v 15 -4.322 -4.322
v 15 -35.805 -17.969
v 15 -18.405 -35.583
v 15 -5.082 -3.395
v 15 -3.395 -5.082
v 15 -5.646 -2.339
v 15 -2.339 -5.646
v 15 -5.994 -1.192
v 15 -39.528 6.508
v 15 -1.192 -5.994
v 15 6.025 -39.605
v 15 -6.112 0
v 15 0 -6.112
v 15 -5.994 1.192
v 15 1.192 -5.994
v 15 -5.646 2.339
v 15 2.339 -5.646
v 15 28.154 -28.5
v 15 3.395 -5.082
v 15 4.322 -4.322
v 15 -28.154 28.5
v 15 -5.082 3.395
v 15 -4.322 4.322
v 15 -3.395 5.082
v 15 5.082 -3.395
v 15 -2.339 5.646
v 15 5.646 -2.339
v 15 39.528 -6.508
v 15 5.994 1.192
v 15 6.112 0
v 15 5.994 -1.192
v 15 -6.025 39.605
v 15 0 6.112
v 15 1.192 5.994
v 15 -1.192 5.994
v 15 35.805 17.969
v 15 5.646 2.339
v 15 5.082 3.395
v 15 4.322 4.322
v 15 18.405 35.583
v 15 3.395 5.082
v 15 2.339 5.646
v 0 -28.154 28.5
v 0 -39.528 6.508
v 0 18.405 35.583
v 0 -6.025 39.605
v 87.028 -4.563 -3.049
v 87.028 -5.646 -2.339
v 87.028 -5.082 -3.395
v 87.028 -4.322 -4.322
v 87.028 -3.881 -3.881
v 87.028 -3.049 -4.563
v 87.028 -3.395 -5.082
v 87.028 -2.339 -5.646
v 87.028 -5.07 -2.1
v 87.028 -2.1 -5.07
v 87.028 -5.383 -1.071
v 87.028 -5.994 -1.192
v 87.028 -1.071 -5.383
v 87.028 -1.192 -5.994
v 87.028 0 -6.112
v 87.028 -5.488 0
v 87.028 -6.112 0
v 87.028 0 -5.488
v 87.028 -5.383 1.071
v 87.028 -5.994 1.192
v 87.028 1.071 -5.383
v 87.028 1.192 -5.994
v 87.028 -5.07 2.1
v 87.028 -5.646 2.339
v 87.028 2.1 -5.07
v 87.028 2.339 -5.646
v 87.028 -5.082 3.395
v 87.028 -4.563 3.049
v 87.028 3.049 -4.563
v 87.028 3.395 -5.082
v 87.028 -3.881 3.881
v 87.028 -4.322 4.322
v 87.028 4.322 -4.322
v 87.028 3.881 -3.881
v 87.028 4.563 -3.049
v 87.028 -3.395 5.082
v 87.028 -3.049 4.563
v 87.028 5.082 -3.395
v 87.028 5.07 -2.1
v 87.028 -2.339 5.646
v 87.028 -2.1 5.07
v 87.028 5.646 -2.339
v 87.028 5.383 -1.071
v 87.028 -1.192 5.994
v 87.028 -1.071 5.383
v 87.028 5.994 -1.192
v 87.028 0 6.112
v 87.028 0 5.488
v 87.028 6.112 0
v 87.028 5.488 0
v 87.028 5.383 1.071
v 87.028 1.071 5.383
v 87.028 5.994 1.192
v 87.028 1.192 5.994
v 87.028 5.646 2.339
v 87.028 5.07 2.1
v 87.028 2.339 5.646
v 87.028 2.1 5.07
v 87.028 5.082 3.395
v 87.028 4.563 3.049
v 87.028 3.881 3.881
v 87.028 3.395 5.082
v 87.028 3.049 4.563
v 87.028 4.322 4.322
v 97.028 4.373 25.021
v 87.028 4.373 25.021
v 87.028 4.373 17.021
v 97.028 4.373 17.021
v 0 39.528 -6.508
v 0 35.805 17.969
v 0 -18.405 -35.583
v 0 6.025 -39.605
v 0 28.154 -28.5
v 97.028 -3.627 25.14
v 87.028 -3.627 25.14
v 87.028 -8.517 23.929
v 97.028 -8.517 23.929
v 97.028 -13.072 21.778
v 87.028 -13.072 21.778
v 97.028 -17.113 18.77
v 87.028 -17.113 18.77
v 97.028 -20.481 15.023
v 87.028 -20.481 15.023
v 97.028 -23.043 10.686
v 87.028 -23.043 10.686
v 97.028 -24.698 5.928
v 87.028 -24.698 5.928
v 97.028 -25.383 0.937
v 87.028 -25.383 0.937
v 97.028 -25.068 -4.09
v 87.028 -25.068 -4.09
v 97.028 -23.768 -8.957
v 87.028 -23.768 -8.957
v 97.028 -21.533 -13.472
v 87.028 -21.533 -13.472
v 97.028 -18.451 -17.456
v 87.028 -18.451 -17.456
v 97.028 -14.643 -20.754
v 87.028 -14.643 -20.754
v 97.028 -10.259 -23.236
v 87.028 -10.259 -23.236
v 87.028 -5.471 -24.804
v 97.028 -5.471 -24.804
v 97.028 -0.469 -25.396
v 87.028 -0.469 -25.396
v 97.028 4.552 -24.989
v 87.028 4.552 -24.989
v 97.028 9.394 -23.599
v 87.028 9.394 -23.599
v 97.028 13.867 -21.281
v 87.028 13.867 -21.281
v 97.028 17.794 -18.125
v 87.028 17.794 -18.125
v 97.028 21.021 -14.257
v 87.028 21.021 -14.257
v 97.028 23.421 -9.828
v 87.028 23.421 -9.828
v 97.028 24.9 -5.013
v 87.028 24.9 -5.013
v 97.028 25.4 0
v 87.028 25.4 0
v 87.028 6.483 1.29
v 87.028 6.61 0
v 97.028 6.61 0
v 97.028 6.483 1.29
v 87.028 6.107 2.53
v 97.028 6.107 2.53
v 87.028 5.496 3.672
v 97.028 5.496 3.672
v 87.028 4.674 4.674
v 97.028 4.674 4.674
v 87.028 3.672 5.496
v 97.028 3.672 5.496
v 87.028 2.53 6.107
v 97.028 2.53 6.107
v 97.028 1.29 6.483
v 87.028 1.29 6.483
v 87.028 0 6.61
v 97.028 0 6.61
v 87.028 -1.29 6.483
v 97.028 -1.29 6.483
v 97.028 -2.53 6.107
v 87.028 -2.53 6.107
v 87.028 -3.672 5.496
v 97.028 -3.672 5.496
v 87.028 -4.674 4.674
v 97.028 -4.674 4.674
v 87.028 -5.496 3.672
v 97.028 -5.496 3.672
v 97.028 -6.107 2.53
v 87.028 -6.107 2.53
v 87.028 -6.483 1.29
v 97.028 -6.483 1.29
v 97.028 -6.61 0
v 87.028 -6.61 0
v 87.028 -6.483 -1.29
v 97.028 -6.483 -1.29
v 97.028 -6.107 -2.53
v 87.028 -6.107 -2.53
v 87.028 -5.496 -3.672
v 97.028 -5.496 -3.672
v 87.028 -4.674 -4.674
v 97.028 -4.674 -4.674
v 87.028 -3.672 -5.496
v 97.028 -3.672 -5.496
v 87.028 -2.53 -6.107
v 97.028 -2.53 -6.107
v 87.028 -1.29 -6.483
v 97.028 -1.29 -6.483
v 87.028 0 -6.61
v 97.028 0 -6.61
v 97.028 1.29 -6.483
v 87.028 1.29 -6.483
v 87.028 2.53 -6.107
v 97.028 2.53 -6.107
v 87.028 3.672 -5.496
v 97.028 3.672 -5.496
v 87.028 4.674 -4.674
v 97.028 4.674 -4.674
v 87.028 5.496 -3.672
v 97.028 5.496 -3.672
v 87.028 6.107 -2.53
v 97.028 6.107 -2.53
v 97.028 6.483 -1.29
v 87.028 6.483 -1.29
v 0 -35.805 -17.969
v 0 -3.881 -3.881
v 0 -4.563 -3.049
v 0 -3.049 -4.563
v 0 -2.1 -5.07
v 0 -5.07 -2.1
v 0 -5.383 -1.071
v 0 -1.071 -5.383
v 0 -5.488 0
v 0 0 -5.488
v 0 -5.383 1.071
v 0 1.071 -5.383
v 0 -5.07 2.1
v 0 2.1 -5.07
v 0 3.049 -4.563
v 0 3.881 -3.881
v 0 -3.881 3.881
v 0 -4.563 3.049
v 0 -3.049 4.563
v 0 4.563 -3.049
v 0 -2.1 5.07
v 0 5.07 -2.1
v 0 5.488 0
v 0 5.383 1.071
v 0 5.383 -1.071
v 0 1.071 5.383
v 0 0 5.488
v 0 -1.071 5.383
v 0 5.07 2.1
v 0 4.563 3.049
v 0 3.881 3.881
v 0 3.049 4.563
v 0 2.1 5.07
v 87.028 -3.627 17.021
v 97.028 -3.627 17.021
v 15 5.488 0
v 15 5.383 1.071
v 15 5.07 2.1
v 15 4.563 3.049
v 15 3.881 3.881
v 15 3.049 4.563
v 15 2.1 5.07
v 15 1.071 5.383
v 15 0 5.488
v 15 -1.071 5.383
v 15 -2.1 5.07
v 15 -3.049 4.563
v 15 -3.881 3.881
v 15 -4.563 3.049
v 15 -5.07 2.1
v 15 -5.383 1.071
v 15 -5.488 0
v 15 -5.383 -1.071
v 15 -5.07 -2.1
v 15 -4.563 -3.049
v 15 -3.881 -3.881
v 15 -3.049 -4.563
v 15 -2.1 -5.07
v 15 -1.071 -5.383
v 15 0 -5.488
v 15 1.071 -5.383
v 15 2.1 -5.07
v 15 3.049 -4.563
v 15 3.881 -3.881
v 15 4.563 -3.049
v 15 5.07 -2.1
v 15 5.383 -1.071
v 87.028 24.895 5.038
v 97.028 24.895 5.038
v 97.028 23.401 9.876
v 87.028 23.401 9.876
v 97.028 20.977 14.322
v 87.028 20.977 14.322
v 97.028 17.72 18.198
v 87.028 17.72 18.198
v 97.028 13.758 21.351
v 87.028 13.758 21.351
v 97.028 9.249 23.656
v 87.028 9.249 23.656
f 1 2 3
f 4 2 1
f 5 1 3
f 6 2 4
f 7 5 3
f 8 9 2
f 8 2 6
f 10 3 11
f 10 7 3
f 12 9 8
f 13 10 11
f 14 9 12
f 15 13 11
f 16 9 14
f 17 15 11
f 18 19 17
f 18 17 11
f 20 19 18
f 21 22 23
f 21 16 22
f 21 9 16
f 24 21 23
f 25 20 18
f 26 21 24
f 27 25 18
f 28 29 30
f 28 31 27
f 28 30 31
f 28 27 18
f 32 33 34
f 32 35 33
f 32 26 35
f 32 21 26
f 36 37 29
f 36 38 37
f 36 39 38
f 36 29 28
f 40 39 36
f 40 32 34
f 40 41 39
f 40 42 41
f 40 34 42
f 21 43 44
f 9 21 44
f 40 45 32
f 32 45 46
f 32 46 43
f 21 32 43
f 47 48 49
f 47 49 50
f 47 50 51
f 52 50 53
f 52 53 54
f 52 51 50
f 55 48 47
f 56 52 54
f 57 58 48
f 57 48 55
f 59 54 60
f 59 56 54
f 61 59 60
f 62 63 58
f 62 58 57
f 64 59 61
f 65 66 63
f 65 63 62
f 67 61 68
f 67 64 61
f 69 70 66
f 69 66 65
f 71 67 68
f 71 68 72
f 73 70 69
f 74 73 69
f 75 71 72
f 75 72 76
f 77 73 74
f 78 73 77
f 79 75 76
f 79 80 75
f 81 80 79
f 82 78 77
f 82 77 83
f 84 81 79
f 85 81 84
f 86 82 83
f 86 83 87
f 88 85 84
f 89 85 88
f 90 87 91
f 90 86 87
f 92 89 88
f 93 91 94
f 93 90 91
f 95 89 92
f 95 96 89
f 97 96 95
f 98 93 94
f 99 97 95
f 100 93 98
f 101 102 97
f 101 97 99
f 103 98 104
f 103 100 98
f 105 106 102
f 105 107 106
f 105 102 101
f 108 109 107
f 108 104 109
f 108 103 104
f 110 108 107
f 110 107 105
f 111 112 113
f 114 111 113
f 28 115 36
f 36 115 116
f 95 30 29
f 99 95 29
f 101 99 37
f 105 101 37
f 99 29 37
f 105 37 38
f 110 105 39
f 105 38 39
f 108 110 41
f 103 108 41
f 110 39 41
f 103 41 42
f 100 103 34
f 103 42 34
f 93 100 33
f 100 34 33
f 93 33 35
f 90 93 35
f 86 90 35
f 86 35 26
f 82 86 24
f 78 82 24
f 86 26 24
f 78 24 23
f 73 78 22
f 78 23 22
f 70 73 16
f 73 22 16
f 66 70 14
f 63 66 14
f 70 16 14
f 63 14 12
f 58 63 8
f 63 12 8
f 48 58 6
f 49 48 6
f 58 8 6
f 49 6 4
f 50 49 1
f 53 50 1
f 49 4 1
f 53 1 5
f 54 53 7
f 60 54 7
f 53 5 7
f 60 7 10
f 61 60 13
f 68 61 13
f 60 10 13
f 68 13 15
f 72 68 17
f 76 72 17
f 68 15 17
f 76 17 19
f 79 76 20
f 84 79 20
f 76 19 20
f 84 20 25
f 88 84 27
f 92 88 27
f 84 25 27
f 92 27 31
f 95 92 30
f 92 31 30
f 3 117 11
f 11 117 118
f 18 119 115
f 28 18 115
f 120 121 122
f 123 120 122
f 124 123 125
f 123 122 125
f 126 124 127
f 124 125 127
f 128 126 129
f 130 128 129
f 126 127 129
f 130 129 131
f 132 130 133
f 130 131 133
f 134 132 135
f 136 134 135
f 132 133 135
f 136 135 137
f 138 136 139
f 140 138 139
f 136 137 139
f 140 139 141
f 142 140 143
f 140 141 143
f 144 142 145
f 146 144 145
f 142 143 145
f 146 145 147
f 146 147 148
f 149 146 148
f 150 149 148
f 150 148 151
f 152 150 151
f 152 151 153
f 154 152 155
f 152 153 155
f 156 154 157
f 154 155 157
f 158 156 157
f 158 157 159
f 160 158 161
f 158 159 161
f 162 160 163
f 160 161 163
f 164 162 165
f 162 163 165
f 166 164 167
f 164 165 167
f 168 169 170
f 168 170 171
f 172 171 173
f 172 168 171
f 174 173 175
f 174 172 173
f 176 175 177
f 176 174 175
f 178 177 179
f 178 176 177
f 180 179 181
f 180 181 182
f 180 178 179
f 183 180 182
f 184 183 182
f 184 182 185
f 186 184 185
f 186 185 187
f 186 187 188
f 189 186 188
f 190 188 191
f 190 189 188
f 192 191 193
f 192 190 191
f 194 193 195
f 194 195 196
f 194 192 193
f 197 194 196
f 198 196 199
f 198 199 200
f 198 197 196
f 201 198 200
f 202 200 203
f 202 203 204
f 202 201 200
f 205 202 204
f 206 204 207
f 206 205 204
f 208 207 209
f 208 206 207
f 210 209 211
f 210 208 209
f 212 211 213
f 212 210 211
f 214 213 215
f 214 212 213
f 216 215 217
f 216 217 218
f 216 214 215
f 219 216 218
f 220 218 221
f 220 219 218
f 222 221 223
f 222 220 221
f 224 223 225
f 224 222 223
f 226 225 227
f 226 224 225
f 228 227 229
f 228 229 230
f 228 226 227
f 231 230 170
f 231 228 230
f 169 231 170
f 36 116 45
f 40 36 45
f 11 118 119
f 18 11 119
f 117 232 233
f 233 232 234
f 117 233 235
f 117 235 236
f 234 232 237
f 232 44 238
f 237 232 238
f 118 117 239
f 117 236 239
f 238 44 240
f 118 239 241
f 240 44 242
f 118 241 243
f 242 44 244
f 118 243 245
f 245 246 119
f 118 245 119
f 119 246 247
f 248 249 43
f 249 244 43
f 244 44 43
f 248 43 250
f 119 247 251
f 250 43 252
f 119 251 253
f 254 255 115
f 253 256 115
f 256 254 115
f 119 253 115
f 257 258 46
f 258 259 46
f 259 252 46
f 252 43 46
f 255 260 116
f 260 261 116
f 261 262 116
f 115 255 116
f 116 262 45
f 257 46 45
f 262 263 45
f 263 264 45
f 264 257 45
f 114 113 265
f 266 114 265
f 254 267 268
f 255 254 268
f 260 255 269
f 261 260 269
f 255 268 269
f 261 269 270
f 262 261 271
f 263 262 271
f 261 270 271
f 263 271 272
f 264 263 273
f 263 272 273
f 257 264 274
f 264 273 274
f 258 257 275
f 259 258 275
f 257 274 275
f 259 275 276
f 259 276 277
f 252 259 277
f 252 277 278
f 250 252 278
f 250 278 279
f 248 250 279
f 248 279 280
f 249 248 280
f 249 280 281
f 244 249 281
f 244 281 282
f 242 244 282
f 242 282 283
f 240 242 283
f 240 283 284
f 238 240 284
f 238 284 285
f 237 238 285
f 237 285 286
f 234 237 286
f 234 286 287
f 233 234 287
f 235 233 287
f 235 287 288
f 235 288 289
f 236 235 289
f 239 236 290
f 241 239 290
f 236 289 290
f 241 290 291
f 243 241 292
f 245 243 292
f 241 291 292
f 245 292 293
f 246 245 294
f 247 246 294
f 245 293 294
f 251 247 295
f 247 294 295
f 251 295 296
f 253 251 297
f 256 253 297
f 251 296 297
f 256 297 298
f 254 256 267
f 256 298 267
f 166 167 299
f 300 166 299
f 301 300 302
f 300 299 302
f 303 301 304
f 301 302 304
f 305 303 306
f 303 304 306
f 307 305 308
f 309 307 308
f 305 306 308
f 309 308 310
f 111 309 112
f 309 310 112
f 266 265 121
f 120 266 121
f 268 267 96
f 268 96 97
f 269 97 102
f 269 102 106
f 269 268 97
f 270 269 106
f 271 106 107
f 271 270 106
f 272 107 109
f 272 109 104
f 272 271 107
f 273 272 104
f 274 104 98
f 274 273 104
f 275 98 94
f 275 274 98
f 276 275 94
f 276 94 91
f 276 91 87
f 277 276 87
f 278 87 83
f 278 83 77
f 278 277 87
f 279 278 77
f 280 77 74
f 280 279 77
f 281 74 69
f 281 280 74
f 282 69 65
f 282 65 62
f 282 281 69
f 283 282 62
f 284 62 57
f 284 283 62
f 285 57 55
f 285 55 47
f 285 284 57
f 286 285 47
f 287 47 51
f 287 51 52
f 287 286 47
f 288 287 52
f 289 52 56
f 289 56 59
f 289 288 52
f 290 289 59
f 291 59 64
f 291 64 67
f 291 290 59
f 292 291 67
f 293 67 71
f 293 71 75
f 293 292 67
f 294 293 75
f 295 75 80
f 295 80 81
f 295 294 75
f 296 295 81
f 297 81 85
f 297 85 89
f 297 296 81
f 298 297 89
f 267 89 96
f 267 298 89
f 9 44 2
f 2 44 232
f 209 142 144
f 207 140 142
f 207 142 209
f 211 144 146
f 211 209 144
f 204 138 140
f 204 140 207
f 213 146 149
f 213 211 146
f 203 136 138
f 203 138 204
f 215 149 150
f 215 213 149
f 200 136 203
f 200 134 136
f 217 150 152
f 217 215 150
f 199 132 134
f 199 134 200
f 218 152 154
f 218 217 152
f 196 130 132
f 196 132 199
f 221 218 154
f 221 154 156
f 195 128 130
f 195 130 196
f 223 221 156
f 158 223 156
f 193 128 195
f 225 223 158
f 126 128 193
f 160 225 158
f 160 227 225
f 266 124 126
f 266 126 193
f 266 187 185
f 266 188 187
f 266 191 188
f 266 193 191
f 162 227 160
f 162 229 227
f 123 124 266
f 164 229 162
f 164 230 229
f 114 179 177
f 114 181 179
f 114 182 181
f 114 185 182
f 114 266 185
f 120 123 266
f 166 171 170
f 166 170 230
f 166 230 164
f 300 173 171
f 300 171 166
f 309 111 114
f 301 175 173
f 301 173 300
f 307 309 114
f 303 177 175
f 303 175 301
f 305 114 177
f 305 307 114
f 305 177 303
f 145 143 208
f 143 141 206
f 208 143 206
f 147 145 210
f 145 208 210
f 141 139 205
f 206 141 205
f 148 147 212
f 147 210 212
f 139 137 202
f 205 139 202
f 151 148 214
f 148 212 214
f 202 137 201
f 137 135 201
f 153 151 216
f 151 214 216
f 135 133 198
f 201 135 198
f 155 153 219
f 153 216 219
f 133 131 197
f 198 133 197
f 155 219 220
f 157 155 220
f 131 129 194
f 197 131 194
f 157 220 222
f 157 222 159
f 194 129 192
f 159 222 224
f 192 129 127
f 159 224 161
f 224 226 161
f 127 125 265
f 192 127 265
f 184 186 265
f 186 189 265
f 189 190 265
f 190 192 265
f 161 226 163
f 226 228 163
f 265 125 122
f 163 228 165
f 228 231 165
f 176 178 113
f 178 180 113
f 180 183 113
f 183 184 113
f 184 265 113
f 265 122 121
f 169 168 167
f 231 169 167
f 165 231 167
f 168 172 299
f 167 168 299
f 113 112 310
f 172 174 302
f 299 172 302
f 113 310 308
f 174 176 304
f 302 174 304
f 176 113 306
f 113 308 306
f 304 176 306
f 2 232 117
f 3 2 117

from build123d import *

# Parameters (mm, degrees)
F1_DEPTH = 15
F2_R     = 5.488031
F3_DEPTH = 25.4
F2_R_2   = 6.111547
F4_DEPTH = 72.027862
F5_R     = 8.188497
F5_R_2   = 6.600496
F6_DEPTH = 10
F8_R     = 6.610273
F9_DEPTH = 10


with BuildPart() as f1:
    # F0 (on Right) → F1 (new body)
    with BuildSketch(Plane.YZ):
        Polygon((28.153695, -28.49965), (39.528491, -6.508374), (35.804748, 17.968879), (18.404807, 35.582631), (-6.025144, 39.605027), (-28.153695, 28.49965), (-39.528491, 6.508374), (-35.804748, -17.968879), (-18.404807, -35.582631), (6.025144, -39.605027), align=None)
    extrude(amount=F1_DEPTH)

    # F2 (on face) → F3 (cut)
    with BuildSketch(Plane.YZ.offset(15)):
        Circle(F2_R)
    extrude(amount=-F3_DEPTH, mode=Mode.SUBTRACT)

    # F2 (on face) → F4 (join)
    with BuildSketch(Plane.YZ.offset(15)):
        Circle(F2_R_2)
        Circle(F2_R, mode=Mode.SUBTRACT)
    extrude(amount=F4_DEPTH)


with BuildPart() as f6:
    # F5 (on face) → F6 (new body)
    with BuildSketch(Plane.YZ.offset(87.027862)):
        Circle(F5_R)
        Circle(F5_R_2, mode=Mode.SUBTRACT)
    extrude(amount=F6_DEPTH)


with BuildPart() as f9:
    # F8 (on face) → F9 (new body)
    with BuildSketch(Plane.YZ.offset(87.027862)):
        with BuildLine():
            ThreePointArc((-3.627016, 25.139705), (-16.628797, -19.200081), (25.4, 0))
            ThreePointArc((25.4, 0), (19.445228, 16.341453), (4.372984, 25.020732))
            Line((4.372984, 25.020732), (4.372984, 17.020732))
            Line((4.372984, 17.020732), (-3.627016, 17.020732))
            Line((-3.627016, 17.020732), (-3.627016, 25.139705))
        make_face()
        Circle(F8_R, mode=Mode.SUBTRACT)
    extrude(amount=F9_DEPTH)


solid = Compound([f1.part, f9.part])
